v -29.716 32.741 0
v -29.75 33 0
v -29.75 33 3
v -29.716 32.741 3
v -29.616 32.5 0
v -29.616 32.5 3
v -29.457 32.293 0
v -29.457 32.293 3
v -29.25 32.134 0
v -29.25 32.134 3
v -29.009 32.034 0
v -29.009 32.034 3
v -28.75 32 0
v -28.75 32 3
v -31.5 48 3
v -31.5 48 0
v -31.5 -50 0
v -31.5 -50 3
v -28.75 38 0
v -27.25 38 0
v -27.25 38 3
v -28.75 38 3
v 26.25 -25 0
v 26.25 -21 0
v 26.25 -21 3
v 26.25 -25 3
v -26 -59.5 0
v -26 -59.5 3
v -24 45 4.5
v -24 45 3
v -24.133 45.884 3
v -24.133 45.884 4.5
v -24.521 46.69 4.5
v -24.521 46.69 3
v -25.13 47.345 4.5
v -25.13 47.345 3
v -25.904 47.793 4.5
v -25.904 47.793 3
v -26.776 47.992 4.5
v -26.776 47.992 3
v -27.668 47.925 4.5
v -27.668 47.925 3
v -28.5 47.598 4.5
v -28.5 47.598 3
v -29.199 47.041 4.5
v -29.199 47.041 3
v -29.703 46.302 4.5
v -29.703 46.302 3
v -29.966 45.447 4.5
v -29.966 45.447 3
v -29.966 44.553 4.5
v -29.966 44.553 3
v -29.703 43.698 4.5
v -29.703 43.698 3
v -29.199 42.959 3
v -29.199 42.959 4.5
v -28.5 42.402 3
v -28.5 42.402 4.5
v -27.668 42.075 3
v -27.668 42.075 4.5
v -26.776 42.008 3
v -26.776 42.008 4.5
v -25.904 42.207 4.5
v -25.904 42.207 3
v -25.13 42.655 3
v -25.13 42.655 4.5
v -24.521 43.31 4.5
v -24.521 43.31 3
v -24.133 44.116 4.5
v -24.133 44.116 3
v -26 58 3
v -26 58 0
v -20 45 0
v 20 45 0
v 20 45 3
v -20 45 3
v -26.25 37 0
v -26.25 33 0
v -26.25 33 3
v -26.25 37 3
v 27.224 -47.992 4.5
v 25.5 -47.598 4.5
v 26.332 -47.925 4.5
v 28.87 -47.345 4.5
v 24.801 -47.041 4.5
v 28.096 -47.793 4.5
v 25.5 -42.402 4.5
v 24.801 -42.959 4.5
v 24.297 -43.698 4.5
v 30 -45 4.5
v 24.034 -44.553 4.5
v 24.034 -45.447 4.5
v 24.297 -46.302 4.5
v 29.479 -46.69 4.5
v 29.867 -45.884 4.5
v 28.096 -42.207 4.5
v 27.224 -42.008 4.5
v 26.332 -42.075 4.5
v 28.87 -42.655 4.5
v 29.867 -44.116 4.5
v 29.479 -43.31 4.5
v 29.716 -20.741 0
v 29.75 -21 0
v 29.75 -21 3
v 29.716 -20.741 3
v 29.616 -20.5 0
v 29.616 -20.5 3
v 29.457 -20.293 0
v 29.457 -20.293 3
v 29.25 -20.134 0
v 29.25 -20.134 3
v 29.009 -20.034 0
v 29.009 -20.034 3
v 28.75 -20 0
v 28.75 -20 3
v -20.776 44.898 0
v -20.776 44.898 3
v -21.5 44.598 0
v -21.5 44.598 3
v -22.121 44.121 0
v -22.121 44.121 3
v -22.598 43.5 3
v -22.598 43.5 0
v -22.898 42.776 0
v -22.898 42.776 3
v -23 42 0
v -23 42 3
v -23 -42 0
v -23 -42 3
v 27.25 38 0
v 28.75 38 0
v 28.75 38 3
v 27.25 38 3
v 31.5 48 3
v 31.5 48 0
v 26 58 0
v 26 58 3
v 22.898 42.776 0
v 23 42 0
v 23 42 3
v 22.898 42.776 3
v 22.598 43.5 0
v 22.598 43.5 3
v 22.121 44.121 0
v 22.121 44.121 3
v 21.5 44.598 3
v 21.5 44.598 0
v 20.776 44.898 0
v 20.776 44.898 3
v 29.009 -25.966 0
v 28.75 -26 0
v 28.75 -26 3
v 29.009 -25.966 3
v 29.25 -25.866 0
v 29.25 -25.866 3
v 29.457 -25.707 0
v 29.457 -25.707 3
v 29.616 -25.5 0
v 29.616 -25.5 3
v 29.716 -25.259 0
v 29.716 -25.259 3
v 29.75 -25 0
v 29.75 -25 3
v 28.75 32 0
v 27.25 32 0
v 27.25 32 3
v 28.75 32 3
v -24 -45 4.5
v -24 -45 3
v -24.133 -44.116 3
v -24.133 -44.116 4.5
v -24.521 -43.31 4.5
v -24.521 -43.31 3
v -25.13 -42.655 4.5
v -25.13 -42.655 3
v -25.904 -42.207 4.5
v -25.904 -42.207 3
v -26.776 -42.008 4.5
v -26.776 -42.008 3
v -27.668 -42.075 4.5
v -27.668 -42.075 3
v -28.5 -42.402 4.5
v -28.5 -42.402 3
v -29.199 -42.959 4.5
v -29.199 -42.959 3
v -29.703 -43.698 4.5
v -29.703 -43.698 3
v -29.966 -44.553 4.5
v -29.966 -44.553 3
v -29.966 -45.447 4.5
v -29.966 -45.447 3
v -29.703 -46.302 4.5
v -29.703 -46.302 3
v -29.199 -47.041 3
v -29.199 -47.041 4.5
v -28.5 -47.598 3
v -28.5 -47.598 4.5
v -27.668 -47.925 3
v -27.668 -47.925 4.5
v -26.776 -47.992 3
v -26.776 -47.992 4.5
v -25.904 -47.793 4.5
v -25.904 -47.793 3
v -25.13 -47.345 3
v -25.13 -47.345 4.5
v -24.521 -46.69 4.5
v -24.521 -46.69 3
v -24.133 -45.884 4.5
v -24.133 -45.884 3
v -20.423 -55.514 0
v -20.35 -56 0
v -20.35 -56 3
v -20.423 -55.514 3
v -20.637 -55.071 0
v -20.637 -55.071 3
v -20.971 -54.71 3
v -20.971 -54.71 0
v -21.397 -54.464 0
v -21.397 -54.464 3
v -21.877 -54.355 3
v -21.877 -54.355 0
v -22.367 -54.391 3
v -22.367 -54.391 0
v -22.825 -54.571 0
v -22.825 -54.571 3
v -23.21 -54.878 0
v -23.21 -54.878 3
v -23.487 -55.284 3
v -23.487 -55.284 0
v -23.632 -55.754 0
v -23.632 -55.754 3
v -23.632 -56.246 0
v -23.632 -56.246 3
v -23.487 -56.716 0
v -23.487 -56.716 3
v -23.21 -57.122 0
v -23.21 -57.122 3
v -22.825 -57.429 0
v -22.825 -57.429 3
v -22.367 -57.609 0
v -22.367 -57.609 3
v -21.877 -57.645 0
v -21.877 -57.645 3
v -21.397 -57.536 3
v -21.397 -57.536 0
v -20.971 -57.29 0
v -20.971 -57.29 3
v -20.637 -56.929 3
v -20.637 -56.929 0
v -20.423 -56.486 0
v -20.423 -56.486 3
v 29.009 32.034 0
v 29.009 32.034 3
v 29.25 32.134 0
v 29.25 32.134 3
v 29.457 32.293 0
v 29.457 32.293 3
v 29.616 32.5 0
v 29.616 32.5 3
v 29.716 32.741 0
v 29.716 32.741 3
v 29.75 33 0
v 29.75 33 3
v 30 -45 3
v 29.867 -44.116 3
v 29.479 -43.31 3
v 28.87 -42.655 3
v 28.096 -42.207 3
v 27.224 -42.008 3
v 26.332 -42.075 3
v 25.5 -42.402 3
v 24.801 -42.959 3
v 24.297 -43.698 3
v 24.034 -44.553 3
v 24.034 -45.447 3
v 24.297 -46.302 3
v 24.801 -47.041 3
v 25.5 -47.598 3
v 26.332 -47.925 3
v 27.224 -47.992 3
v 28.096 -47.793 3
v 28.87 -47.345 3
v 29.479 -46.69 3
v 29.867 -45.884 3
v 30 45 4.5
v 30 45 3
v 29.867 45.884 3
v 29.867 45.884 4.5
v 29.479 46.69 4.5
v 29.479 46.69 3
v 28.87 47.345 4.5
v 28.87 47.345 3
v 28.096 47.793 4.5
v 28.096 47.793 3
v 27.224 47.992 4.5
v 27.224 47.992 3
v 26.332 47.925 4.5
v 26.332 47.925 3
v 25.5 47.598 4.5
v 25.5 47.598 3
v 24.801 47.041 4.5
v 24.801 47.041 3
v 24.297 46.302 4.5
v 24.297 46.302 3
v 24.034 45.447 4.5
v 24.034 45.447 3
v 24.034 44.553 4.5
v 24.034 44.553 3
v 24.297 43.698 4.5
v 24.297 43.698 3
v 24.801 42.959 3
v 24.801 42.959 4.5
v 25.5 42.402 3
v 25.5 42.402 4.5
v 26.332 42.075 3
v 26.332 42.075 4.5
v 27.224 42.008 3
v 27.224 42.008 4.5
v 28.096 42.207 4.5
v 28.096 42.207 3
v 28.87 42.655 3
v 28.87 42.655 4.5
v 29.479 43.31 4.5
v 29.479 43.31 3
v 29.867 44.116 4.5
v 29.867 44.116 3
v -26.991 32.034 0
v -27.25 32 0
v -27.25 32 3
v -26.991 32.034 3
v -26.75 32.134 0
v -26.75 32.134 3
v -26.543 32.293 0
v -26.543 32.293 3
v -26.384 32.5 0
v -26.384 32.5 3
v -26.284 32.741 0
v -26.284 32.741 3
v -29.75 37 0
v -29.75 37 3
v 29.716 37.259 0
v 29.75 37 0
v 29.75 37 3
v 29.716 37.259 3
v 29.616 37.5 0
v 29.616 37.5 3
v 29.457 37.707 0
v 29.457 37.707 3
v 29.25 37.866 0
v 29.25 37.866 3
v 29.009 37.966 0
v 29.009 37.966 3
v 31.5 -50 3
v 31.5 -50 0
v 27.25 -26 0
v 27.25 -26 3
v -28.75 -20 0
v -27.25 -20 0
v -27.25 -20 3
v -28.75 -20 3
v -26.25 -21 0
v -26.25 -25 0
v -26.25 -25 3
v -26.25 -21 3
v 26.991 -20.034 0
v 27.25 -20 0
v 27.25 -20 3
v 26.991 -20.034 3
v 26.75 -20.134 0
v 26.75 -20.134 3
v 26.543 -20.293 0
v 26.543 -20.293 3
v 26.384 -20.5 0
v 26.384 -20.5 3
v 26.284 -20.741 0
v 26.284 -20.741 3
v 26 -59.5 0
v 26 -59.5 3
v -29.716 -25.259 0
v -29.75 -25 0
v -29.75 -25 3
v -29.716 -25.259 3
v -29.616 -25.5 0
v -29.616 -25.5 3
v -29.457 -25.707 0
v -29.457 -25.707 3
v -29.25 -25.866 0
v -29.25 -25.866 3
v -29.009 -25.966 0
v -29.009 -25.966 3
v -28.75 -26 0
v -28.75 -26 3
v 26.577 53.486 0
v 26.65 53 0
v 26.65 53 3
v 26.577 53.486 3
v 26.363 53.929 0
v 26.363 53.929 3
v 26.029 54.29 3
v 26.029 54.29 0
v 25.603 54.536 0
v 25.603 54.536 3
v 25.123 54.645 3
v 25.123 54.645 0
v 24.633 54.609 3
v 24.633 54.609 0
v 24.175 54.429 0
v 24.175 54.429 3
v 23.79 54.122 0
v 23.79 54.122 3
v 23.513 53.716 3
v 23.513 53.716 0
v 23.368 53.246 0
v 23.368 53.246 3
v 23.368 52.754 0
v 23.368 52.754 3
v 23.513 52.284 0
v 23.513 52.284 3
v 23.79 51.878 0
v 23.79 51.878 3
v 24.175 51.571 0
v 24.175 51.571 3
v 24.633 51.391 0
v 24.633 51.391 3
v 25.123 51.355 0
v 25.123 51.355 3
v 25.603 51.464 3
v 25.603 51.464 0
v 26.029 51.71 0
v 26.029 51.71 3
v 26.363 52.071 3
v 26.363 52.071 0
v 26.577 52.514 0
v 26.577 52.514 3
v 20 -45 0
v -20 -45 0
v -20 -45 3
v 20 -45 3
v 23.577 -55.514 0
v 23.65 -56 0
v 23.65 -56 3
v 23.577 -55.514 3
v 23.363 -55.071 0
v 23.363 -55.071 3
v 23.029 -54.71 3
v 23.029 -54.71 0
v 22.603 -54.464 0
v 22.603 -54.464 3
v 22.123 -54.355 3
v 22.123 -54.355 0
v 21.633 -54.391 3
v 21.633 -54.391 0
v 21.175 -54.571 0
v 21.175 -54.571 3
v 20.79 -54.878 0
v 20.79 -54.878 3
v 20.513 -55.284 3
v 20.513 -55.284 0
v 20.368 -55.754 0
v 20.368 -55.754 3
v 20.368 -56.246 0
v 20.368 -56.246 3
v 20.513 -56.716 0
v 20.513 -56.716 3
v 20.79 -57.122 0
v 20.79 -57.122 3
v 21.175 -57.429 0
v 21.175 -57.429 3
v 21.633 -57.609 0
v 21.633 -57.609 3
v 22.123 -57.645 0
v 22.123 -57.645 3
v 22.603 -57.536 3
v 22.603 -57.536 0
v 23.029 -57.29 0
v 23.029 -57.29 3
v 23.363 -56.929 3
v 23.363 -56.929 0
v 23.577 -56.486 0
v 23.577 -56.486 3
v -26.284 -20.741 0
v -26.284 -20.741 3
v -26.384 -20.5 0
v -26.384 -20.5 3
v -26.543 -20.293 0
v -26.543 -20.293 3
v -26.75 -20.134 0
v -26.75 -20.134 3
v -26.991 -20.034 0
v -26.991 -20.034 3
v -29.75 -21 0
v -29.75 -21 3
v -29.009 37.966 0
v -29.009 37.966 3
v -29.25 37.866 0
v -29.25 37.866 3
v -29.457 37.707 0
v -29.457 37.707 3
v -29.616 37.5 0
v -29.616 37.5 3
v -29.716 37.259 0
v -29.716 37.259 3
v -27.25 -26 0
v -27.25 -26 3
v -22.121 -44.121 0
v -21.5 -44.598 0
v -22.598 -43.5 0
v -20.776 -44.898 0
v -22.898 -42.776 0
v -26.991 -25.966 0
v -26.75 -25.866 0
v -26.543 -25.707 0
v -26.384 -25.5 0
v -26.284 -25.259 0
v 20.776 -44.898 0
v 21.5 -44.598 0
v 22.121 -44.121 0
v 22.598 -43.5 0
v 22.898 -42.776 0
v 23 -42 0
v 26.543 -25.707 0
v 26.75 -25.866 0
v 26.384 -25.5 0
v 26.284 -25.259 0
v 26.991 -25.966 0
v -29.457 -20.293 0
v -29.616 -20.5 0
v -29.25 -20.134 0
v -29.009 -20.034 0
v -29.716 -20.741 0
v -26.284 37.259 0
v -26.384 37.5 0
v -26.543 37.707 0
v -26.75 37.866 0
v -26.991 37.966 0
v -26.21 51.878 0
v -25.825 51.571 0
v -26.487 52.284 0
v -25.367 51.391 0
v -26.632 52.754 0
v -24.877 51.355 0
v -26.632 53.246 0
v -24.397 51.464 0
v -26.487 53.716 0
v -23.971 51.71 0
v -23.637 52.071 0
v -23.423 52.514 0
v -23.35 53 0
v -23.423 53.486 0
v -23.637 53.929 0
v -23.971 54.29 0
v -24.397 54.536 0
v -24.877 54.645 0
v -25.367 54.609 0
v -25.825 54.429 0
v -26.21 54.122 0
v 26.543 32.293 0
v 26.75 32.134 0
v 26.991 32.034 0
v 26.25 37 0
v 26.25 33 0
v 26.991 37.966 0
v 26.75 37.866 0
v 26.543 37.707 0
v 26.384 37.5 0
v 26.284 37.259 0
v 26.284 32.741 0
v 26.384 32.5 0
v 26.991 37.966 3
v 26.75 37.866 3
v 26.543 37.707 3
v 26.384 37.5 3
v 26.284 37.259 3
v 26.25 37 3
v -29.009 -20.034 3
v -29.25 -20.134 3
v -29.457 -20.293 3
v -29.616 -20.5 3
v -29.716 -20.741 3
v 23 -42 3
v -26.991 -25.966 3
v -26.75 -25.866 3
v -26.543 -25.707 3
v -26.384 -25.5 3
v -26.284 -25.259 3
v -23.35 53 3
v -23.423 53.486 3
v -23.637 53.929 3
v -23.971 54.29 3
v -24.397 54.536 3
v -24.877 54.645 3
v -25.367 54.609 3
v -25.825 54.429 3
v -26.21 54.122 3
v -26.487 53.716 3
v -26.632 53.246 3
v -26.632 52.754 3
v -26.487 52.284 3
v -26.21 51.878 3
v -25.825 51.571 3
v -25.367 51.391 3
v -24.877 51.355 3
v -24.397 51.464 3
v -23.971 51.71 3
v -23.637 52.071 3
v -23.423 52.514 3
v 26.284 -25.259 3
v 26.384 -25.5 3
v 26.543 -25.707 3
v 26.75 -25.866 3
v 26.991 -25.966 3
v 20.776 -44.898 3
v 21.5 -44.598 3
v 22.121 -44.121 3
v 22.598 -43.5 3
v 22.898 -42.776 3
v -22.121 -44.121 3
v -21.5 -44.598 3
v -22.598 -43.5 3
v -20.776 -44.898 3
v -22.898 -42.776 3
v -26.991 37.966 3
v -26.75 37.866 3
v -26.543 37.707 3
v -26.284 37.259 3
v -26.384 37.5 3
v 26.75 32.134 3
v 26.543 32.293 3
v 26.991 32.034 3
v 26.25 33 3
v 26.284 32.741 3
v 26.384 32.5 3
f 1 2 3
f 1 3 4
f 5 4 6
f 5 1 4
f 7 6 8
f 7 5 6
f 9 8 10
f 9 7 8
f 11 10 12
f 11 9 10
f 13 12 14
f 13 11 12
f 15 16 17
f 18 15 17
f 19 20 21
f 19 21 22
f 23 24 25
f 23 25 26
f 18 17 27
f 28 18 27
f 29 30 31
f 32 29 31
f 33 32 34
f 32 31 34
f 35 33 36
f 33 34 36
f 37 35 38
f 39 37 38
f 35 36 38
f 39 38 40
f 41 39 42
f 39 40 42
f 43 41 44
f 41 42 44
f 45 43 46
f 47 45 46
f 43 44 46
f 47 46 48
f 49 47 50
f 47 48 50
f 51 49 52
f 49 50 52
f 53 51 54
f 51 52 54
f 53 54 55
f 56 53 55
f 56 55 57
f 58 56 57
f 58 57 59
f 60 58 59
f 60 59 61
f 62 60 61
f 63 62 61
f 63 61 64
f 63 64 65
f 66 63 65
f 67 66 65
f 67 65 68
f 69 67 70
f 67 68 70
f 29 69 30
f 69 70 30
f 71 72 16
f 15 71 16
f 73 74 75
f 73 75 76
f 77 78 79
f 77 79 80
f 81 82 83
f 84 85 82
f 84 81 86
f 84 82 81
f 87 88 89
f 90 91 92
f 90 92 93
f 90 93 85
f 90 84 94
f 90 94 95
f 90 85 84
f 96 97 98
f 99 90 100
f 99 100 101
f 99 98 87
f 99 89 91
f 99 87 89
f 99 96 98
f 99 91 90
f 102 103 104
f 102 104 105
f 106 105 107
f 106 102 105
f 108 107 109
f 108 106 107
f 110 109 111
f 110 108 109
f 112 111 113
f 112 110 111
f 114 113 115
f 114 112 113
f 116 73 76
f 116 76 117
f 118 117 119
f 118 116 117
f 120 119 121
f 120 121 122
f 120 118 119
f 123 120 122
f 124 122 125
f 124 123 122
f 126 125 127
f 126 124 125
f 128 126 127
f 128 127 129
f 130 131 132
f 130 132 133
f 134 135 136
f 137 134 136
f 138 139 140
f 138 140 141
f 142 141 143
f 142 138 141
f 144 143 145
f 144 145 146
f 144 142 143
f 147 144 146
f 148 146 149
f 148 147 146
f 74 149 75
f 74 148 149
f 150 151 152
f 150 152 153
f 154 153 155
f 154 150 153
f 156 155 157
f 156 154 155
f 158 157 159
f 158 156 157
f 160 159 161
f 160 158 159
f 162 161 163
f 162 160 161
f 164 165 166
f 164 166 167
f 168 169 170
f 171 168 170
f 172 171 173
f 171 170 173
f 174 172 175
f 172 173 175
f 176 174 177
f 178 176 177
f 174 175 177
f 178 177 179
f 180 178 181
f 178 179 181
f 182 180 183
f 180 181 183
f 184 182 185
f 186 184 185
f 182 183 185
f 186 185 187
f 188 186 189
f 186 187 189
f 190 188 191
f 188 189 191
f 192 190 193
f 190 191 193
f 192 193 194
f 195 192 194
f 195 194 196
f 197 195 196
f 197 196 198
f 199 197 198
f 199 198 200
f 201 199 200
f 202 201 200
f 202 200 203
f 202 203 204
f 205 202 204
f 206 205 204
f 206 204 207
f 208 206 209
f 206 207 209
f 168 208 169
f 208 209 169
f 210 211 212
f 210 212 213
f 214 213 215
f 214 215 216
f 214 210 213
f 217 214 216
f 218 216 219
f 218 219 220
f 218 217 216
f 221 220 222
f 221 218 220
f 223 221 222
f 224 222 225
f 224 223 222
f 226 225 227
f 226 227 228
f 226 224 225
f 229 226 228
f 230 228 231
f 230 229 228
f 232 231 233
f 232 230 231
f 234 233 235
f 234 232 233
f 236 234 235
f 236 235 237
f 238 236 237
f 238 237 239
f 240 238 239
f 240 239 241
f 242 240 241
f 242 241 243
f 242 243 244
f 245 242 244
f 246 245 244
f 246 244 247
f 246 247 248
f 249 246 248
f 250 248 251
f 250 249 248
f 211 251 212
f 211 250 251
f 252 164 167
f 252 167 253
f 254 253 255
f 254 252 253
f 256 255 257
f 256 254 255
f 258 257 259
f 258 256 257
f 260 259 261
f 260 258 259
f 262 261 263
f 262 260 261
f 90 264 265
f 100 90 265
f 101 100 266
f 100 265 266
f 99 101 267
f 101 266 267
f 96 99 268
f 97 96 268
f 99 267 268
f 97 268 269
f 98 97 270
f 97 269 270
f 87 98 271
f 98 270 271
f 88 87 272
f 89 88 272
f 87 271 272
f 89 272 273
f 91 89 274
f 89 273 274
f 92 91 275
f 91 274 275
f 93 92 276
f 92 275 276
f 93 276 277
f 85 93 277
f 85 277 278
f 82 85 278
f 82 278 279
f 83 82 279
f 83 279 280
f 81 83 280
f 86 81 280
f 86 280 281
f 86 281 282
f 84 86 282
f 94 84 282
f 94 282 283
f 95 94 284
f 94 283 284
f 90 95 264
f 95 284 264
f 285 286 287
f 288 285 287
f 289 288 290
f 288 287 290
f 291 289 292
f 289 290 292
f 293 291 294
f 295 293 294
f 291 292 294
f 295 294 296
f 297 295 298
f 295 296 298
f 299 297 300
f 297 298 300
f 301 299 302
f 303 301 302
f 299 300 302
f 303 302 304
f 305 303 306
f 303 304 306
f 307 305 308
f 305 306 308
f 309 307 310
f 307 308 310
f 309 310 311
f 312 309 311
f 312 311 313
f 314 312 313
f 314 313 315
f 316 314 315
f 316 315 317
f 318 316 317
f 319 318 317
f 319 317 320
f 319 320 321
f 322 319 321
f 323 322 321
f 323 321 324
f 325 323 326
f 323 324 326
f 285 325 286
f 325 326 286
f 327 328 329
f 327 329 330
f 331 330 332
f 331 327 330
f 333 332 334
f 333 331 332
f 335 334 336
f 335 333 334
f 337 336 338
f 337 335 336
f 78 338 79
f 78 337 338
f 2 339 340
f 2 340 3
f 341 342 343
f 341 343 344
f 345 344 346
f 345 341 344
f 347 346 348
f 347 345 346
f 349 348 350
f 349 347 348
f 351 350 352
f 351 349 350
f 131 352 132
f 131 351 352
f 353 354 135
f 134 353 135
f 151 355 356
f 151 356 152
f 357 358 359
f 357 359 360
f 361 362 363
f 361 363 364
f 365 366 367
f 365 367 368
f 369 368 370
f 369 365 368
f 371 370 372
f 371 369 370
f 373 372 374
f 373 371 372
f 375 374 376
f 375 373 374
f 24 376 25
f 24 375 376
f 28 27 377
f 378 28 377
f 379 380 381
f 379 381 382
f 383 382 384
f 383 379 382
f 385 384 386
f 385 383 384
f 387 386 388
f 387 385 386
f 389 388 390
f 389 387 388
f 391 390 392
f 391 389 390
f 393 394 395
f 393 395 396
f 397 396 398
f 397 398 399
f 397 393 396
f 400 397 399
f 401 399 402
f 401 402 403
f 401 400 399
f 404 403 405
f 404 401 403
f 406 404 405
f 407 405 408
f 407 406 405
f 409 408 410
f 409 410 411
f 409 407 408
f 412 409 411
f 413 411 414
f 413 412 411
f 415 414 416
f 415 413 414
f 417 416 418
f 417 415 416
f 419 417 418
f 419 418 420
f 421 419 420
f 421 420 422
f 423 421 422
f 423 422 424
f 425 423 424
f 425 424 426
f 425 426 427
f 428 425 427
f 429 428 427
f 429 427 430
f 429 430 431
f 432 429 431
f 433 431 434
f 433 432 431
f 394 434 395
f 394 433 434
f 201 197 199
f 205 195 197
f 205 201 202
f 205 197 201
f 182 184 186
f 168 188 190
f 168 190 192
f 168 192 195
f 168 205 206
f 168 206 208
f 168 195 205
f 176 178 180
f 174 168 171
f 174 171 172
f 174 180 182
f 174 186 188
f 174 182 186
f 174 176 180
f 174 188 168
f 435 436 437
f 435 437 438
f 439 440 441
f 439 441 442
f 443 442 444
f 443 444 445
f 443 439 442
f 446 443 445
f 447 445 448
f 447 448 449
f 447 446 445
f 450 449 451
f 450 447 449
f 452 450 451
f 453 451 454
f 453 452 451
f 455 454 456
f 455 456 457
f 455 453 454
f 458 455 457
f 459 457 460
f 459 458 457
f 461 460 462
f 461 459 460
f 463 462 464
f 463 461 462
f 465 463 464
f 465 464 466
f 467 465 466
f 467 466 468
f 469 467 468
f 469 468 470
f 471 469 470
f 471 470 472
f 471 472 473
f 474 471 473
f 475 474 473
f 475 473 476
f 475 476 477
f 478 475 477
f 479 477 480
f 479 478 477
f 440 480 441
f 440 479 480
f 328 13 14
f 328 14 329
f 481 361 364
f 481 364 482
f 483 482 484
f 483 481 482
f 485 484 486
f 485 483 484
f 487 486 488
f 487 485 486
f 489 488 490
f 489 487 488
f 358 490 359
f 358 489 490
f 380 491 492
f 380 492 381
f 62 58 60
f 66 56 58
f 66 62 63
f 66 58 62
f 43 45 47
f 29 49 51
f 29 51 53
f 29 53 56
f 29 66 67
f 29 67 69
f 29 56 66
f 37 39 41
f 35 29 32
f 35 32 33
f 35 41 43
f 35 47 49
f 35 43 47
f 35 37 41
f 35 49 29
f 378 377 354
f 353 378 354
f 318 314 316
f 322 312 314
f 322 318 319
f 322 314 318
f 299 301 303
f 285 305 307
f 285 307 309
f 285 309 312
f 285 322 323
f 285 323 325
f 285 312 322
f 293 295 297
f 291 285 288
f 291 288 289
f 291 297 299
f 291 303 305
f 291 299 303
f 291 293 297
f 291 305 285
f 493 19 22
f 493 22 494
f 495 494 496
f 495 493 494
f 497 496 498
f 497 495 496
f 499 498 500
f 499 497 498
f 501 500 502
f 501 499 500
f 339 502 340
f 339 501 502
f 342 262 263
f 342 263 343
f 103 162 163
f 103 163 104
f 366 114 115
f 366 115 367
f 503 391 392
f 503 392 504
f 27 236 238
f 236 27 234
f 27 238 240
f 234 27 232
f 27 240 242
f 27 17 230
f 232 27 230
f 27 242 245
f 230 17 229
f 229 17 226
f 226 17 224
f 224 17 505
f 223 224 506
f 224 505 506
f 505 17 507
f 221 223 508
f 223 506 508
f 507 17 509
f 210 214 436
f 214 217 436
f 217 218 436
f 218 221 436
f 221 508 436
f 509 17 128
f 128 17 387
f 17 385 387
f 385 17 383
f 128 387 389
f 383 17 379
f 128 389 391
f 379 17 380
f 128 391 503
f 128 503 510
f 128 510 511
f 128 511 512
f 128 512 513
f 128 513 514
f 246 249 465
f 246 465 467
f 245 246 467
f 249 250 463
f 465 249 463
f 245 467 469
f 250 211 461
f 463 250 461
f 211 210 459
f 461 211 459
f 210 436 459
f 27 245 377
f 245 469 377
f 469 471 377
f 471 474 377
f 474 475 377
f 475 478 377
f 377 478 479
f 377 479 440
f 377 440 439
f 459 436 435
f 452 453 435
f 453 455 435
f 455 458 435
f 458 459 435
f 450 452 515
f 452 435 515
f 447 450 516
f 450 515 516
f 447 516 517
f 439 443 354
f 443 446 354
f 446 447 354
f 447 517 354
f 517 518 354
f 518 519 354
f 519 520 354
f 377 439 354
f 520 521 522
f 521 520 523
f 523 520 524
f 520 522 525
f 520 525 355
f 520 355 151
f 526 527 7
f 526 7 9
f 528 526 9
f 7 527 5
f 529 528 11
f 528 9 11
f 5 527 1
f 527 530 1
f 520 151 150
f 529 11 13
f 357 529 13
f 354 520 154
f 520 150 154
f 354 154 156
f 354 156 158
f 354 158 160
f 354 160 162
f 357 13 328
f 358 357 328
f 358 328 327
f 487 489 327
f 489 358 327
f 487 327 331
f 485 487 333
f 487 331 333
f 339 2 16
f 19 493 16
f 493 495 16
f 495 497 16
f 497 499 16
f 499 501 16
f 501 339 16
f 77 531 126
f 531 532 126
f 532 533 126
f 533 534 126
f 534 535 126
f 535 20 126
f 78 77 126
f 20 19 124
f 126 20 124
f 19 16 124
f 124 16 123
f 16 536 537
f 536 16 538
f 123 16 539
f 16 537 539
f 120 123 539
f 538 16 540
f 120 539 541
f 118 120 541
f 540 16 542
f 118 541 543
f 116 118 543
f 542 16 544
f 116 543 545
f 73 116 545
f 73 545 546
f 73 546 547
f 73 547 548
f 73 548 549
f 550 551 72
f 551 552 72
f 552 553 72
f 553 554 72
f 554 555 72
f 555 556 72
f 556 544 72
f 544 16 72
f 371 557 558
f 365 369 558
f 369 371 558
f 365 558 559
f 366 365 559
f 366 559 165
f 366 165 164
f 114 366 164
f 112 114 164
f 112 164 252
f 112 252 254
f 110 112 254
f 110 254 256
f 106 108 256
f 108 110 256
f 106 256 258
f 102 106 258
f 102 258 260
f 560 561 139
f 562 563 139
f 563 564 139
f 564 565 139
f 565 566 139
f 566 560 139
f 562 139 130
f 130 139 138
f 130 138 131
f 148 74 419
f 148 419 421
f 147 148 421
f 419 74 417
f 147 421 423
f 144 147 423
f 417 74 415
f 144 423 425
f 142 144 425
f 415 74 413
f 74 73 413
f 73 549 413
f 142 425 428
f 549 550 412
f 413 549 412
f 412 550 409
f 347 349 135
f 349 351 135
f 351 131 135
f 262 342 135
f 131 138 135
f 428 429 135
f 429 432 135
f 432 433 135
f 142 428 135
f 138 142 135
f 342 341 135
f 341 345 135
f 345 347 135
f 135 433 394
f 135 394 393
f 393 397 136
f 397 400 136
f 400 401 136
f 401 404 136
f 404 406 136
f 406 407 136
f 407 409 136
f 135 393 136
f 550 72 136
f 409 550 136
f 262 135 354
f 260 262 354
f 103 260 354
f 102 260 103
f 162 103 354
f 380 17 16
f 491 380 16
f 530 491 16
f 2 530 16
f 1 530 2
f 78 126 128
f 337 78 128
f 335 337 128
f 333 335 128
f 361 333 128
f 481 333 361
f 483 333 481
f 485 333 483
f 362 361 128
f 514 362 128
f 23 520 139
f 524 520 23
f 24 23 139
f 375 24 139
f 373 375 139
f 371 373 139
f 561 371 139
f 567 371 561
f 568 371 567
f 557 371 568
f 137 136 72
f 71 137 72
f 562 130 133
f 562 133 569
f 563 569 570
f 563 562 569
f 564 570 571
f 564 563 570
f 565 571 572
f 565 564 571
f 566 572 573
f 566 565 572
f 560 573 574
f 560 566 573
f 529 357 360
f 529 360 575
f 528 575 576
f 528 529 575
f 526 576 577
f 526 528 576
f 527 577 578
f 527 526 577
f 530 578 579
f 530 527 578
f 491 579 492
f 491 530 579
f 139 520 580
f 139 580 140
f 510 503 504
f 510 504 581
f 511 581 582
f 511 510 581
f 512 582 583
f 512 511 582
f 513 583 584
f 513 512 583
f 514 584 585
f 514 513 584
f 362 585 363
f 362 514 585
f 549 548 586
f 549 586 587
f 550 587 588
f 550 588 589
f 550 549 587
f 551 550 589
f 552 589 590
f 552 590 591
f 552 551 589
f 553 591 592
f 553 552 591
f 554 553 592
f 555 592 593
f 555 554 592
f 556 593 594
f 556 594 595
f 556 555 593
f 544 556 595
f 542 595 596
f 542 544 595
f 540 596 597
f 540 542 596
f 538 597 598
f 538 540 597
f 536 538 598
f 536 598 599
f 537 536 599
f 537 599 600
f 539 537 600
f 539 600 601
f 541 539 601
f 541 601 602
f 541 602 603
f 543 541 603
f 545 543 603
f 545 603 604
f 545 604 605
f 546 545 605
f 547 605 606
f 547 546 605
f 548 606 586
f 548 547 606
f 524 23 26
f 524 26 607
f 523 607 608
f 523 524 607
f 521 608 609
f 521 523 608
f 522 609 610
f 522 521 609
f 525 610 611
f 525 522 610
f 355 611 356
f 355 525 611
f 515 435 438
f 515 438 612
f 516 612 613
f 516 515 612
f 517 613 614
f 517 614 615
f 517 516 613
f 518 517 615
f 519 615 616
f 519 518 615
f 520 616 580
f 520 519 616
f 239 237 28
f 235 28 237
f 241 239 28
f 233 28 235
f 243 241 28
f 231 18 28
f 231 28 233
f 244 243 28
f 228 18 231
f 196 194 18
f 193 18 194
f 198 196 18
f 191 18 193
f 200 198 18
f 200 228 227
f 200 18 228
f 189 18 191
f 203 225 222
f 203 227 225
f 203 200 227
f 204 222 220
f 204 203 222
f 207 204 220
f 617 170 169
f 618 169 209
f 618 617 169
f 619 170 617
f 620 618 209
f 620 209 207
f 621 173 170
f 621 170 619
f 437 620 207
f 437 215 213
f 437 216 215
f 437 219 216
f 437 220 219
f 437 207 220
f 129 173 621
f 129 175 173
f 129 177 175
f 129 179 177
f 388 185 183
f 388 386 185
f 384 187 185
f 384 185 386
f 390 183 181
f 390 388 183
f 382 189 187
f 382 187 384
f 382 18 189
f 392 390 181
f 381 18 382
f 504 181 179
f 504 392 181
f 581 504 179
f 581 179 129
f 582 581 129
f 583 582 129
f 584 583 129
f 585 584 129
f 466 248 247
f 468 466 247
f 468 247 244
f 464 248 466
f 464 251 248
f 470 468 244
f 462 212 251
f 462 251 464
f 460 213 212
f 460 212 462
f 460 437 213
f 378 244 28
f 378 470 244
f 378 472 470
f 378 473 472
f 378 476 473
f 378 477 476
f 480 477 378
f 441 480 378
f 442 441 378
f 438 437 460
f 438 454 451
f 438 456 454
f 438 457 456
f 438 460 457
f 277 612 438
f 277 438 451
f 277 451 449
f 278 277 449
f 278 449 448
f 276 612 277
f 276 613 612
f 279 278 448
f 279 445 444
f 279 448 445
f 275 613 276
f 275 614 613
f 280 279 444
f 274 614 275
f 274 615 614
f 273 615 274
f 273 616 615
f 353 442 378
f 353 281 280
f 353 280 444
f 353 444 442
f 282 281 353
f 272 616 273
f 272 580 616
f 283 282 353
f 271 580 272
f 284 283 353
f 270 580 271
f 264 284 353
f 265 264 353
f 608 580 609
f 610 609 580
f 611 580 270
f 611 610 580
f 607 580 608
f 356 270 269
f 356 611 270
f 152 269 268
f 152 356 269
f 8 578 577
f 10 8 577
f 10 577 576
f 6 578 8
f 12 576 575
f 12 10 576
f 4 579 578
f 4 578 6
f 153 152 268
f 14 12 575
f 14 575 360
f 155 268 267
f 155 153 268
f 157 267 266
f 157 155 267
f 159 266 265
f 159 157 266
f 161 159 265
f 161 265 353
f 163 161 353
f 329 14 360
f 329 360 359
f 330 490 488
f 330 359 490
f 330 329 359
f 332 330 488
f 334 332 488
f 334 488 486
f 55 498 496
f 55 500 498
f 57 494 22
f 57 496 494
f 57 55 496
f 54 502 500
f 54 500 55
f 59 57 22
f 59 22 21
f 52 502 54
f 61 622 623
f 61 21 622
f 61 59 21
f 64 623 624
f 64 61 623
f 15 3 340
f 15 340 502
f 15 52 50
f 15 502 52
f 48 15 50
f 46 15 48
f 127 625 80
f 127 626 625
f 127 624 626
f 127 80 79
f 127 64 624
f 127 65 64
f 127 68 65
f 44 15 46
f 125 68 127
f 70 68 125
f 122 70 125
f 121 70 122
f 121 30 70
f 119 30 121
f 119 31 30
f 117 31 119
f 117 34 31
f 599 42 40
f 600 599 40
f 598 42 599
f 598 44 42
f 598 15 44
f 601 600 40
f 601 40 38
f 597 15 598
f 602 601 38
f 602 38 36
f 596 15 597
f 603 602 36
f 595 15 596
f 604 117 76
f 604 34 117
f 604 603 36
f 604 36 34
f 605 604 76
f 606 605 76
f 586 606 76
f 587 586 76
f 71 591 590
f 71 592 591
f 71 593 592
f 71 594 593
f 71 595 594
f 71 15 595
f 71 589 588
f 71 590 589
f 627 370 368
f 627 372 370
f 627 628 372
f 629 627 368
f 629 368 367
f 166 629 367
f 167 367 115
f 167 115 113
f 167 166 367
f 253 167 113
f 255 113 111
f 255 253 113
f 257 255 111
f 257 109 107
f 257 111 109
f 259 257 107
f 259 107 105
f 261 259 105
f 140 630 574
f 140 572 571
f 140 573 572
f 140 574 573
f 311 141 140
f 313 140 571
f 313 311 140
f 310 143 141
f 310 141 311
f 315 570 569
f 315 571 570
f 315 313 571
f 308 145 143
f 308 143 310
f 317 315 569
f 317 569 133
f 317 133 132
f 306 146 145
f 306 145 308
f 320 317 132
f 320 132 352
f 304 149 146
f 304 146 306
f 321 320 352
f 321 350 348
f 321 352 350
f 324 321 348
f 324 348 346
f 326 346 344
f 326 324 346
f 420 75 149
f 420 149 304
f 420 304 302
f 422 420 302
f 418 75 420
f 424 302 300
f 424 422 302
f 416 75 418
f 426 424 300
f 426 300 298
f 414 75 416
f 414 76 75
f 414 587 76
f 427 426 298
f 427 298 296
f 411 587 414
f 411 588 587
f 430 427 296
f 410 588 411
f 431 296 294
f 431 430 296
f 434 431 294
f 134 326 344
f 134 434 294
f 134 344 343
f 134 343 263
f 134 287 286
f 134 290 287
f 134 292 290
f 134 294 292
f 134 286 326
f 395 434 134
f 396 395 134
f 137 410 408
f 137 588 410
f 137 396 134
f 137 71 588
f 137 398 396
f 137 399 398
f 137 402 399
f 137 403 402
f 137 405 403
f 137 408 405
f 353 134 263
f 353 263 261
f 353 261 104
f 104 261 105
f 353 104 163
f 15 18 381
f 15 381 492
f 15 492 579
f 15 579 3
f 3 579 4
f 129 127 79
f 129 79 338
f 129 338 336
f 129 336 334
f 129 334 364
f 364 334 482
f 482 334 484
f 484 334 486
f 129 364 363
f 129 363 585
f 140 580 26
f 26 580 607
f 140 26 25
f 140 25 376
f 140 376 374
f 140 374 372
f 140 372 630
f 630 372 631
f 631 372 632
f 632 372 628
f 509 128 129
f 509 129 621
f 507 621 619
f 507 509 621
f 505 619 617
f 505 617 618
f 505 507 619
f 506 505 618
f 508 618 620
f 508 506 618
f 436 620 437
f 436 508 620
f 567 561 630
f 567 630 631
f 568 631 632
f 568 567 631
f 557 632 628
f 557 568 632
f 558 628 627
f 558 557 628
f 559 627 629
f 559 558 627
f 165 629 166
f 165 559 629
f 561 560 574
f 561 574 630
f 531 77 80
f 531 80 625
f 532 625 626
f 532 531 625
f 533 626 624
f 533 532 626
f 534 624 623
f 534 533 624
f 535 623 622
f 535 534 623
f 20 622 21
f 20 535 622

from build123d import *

# Parameters (mm, degrees)
SKETCH_4_R            = 1.65
EXTRUDE_258_DEPTH     = 3
CUT_EXTRUDE_383_DEPTH = 3
PCB_1P5MM_START       = 3
SKETCH_6_R            = 3
PCB_1P5MM_DEPTH       = 1.5


with BuildPart() as part:
    # 草图4 → Extrude 258 (new body)
    with BuildSketch(Plane.XY):
        Polygon((-26, -59.5), (26, -59.5), (31.5, -50), (31.5, 48), (26, 58), (-26, 58), (-31.5, 48), (-31.5, -50), align=None)
        with Locations((-22, -56)):
            Circle(SKETCH_4_R, mode=Mode.SUBTRACT)
        with Locations((-25, 53)):
            Circle(SKETCH_4_R, mode=Mode.SUBTRACT)
        with Locations((22, -56)):
            Circle(SKETCH_4_R, mode=Mode.SUBTRACT)
        with Locations((25, 53)):
            Circle(SKETCH_4_R, mode=Mode.SUBTRACT)
        with BuildLine():
            Line((-20, -45), (20, -45))
            ThreePointArc((20, -45), (22.121320344, -44.121320344), (23, -42))
            Line((23, -42), (23, 42))
            ThreePointArc((23, 42), (22.121320344, 44.121320344), (20, 45))
            Line((20, 45), (-20, 45))
            ThreePointArc((-20, 45), (-22.121320344, 44.121320344), (-23, 42))
            Line((-23, 42), (-23, -42))
            ThreePointArc((-23, -42), (-22.121320344, -44.121320344), (-20, -45))
        make_face(mode=Mode.SUBTRACT)
    extrude(amount=EXTRUDE_258_DEPTH)

    # 草图5 → Cut-Extrude 383 (cut)
    with BuildSketch(Plane.XY):
        with BuildLine():
            Line((-28.75, -26), (-27.25, -26))
            ThreePointArc((-27.25, -26), (-26.542893219, -25.707106781), (-26.25, -25))
            Line((-26.25, -25), (-26.25, -21))
            ThreePointArc((-26.25, -21), (-26.542893219, -20.292893219), (-27.25, -20))
            Line((-27.25, -20), (-28.75, -20))
            ThreePointArc((-28.75, -20), (-29.457106781, -20.292893219), (-29.75, -21))
            Line((-29.75, -21), (-29.75, -25))
            ThreePointArc((-29.75, -25), (-29.457106781, -25.707106781), (-28.75, -26))
        make_face()
        with BuildLine():
            Line((-28.75, 32), (-27.25, 32))
            ThreePointArc((-27.25, 32), (-26.542893219, 32.292893219), (-26.25, 33))
            Line((-26.25, 33), (-26.25, 37))
            ThreePointArc((-26.25, 37), (-26.542893219, 37.707106781), (-27.25, 38))
            Line((-27.25, 38), (-28.75, 38))
            ThreePointArc((-28.75, 38), (-29.457106781, 37.707106781), (-29.75, 37))
            Line((-29.75, 37), (-29.75, 33))
            ThreePointArc((-29.75, 33), (-29.457106781, 32.292893219), (-28.75, 32))
        make_face()
        with BuildLine():
            Line((27.25, -26), (28.75, -26))
            ThreePointArc((28.75, -26), (29.457106781, -25.707106781), (29.75, -25))
            Line((29.75, -25), (29.75, -21))
            ThreePointArc((29.75, -21), (29.457106781, -20.292893219), (28.75, -20))
            Line((28.75, -20), (27.25, -20))
            ThreePointArc((27.25, -20), (26.542893219, -20.292893219), (26.25, -21))
            Line((26.25, -21), (26.25, -25))
            ThreePointArc((26.25, -25), (26.542893219, -25.707106781), (27.25, -26))
        make_face()
        with BuildLine():
            Line((27.25, 32), (28.75, 32))
            ThreePointArc((28.75, 32), (29.457106781, 32.292893219), (29.75, 33))
            Line((29.75, 33), (29.75, 37))
            ThreePointArc((29.75, 37), (29.457106781, 37.707106781), (28.75, 38))
            Line((28.75, 38), (27.25, 38))
            ThreePointArc((27.25, 38), (26.542893219, 37.707106781), (26.25, 37))
            Line((26.25, 37), (26.25, 33))
            ThreePointArc((26.25, 33), (26.542893219, 32.292893219), (27.25, 32))
        make_face()
    extrude(amount=CUT_EXTRUDE_383_DEPTH, mode=Mode.SUBTRACT)

    # 草图6 → PCB下1p5mm绝缘支垫 (add)
    with BuildSketch(Plane.XY.offset(PCB_1P5MM_START)):
        with Locations((-27, -45)):
            Circle(SKETCH_6_R)
        with Locations((-27, 45)):
            Circle(SKETCH_6_R)
        with Locations((27, -45)):
            Circle(SKETCH_6_R)
        with Locations((27, 45)):
            Circle(SKETCH_6_R)
    extrude(amount=PCB_1P5MM_DEPTH)


solid = part.part
